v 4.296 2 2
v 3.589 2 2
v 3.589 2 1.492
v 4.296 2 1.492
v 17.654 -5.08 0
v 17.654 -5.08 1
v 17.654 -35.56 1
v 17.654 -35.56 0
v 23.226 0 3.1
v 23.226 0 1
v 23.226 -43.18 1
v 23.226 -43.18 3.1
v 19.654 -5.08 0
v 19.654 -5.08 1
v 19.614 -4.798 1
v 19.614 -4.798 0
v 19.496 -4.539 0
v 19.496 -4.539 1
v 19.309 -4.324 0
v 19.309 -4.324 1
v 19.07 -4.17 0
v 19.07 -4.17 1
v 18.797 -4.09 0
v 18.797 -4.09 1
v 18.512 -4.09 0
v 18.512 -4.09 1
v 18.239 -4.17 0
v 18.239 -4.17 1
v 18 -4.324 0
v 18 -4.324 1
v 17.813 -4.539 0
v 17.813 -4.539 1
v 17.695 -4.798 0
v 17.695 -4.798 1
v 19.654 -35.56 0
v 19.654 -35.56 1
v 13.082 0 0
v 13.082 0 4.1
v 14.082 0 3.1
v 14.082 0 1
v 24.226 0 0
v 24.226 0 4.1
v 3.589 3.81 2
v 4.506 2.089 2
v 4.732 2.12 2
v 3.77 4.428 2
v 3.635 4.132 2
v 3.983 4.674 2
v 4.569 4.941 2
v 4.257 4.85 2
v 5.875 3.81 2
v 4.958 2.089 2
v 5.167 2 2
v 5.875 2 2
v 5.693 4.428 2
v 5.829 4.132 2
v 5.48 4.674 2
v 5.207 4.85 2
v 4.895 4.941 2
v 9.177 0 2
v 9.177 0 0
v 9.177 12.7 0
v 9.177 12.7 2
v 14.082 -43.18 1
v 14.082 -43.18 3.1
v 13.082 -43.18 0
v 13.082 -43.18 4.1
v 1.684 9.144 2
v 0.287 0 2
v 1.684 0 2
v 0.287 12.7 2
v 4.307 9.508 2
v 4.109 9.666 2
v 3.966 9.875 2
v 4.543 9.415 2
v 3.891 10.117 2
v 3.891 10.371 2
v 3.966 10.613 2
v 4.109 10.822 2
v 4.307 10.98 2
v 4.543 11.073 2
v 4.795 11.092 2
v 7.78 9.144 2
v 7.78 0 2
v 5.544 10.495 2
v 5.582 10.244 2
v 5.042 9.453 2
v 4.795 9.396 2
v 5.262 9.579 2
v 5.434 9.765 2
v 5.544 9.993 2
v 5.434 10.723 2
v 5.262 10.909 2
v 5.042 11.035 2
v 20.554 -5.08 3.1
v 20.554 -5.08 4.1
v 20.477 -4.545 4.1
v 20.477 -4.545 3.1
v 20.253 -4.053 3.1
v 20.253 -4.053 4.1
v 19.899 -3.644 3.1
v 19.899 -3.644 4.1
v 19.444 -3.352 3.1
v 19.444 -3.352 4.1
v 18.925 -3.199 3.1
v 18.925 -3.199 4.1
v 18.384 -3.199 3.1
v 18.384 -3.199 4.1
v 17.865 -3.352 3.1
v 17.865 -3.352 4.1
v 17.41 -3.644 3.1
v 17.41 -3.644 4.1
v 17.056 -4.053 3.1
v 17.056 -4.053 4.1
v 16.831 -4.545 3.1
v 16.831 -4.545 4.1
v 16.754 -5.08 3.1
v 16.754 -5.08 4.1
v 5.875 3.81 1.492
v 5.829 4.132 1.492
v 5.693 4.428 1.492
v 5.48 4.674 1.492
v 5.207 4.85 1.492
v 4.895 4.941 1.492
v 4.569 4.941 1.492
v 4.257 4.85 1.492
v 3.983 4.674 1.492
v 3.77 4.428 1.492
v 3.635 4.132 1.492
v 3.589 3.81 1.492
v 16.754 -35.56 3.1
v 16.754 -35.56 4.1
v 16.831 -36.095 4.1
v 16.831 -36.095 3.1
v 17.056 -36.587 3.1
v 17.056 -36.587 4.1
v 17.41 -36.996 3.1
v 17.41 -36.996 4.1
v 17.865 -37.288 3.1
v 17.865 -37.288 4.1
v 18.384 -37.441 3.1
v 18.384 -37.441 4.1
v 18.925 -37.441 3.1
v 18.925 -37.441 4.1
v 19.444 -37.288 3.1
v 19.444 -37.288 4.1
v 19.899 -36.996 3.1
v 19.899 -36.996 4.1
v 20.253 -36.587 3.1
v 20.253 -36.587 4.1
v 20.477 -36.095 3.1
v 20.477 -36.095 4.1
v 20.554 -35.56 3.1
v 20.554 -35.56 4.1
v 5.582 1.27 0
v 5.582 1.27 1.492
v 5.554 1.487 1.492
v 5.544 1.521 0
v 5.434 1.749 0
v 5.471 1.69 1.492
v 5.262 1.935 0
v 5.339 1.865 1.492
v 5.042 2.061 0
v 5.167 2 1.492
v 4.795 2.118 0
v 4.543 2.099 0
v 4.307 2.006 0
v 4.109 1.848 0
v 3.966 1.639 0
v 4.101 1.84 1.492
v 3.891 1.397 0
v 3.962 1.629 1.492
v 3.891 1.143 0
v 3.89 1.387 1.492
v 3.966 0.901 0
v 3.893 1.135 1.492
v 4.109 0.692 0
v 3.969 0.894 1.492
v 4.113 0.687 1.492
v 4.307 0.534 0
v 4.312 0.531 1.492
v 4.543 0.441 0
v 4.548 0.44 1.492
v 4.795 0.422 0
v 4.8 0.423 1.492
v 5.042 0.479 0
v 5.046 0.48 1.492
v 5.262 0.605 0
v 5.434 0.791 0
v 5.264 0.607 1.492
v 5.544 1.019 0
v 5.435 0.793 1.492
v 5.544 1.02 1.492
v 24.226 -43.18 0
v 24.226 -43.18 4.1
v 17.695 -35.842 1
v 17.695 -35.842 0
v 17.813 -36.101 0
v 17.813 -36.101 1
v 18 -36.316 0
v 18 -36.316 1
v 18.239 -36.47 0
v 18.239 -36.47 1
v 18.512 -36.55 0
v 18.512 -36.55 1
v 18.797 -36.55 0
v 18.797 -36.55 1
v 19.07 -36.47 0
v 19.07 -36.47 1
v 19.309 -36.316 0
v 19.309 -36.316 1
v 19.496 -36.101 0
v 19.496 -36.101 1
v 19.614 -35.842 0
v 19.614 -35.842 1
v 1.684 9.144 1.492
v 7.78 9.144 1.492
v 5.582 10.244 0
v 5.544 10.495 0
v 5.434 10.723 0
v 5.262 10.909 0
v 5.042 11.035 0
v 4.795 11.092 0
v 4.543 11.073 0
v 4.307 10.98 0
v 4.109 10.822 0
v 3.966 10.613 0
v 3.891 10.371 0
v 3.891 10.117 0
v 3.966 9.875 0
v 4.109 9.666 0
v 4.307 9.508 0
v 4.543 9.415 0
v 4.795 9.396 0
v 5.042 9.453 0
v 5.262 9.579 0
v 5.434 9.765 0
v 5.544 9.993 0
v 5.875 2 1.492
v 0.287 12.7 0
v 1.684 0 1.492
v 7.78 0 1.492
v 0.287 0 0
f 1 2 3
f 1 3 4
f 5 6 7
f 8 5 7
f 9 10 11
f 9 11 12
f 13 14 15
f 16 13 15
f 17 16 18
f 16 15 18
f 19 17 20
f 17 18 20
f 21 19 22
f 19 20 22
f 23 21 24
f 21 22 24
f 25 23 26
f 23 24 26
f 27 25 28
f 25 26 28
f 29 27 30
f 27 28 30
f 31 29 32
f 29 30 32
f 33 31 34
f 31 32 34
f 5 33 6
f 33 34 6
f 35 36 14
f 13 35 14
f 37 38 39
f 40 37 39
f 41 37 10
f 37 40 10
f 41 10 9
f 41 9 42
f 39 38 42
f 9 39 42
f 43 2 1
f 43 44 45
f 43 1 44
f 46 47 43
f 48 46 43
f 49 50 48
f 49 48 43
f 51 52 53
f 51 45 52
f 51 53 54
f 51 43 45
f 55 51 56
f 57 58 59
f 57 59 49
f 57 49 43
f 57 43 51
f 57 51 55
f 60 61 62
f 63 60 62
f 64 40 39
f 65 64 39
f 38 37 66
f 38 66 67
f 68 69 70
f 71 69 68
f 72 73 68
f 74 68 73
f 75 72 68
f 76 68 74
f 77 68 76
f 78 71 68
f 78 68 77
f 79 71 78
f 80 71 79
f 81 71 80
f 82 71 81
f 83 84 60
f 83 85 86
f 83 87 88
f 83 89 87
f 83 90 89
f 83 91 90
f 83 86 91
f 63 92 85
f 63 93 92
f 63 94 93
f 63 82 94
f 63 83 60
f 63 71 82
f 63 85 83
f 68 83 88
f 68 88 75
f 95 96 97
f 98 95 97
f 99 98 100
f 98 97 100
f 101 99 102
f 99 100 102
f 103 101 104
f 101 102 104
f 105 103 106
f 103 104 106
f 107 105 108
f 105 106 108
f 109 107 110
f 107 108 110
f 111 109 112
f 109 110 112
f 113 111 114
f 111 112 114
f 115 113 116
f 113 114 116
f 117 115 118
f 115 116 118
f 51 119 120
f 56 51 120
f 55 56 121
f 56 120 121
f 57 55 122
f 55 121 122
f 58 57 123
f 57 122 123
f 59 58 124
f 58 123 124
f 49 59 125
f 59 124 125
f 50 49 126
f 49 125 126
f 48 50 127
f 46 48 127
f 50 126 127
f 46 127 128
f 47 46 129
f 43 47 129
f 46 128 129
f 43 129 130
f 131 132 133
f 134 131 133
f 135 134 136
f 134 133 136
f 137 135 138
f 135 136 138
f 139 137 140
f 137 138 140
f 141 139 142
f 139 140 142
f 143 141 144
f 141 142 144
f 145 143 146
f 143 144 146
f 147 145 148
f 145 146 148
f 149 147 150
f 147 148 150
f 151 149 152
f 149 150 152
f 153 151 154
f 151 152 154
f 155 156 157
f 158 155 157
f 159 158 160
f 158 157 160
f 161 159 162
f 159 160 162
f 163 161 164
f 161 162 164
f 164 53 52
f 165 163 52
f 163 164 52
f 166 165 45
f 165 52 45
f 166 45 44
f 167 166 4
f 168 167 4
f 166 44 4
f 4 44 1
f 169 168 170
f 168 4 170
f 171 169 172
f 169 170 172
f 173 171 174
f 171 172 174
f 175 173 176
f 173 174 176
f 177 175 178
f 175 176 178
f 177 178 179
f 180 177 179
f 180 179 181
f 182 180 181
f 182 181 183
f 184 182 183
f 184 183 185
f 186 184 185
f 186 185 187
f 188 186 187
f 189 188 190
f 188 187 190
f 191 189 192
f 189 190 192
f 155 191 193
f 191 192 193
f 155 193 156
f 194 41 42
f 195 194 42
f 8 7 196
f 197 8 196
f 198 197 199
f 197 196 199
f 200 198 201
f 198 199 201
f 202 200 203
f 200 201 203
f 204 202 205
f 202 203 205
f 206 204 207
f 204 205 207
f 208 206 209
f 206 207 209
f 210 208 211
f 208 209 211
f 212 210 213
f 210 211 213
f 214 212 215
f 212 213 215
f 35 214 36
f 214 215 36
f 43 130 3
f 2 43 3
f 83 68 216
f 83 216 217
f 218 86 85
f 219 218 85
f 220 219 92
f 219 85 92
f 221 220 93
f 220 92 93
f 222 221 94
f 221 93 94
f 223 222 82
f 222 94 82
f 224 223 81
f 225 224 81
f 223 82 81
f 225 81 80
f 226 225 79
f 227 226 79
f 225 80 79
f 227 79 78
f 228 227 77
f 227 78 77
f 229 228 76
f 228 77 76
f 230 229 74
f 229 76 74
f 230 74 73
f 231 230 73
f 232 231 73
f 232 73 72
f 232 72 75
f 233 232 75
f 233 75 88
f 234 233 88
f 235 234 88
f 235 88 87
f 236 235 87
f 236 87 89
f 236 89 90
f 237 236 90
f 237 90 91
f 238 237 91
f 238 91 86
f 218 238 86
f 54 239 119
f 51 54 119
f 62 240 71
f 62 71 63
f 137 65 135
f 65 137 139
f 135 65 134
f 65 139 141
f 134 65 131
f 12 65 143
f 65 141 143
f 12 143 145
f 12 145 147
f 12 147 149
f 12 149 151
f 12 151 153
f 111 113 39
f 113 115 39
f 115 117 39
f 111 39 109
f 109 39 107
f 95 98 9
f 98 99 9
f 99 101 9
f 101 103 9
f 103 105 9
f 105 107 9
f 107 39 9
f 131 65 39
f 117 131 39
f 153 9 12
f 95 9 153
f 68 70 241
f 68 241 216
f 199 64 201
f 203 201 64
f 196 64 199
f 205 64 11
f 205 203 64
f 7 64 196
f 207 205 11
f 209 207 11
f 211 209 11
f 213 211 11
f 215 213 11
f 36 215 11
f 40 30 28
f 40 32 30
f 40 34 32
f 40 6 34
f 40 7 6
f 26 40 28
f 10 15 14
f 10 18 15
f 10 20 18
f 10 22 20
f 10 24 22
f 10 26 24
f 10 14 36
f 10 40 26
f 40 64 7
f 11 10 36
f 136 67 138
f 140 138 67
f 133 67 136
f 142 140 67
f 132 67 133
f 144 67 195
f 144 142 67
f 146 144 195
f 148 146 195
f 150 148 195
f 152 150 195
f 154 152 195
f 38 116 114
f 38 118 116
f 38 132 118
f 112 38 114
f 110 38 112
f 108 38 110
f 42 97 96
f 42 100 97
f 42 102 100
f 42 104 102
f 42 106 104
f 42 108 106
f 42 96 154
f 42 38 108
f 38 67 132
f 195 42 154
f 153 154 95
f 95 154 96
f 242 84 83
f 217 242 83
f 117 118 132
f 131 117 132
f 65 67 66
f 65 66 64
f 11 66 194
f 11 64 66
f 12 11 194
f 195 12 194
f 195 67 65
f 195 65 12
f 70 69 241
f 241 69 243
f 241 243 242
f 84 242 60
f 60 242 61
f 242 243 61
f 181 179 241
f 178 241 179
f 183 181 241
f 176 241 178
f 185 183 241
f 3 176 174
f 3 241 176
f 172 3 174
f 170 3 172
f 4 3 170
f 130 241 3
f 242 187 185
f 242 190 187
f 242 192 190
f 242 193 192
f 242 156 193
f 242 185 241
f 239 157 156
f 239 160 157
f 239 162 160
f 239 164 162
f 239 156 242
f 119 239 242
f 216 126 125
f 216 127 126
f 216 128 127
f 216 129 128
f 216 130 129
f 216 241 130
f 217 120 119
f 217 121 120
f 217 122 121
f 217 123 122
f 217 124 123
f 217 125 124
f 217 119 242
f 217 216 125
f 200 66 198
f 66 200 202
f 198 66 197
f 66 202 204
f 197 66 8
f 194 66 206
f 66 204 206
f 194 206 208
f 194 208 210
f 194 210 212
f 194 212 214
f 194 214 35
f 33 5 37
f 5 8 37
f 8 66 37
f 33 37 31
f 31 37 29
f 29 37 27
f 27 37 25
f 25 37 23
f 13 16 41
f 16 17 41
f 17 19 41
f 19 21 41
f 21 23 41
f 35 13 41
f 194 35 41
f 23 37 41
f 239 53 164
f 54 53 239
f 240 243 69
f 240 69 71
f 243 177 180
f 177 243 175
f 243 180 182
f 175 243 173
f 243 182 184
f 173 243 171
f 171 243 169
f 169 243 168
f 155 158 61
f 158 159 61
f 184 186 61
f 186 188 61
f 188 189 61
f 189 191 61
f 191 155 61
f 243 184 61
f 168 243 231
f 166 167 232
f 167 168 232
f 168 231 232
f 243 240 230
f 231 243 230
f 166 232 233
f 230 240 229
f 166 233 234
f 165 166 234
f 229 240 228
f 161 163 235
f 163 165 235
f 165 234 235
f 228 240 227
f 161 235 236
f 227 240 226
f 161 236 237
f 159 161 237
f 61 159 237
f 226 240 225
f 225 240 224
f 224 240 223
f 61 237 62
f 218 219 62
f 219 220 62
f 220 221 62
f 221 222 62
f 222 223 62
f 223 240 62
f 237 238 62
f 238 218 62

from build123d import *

# Parameters (mm, degrees)
F0_W      = 8.89
F0_H      = 12.7
F1_DEPTH  = 2
F2_W      = 6.096
F2_H      = 9.144
F3_DEPTH  = 0.508
F5_DEPTH  = 0.508
F6_R      = 0.85
F7_DEPTH  = 25.4
F8_W      = 5.08
F8_H      = 2
F9_DEPTH  = 0.508
F10_W     = 11.144
F10_H     = 4.1
F10_W_2   = 9.144
F10_H_2   = 2.1
F11_DEPTH = 43.18
F13_DEPTH = 2.54
F15_DEPTH = 25.4


with BuildPart() as f1:
    # F0 (on Top) → F1 (new body)
    with BuildSketch(Plane.XY):
        with Locations((4.731853, 6.35)):
            Rectangle(F0_W, F0_H)
    extrude(amount=F1_DEPTH)

    # F2 (on face) → F3 (cut)
    with BuildSketch(Plane.XY.offset(2)):
        with Locations((4.731853, 4.572)):
            Rectangle(F2_W, F2_H)
    extrude(amount=-F3_DEPTH, mode=Mode.SUBTRACT)

    # F4 (on face) → F5 (join)
    with BuildSketch(Plane.XY.offset(1.492)):
        with BuildLine():
            ThreePointArc((5.874853, 3.81), (4.731853, 4.953), (3.588853, 3.81))
            Line((3.588853, 3.81), (3.588853, 1.27))
            ThreePointArc((3.588853, 1.27), (4.731853, 0.127), (5.874853, 1.27))
            Line((5.874853, 1.27), (5.874853, 3.81))
        make_face()
    extrude(amount=F5_DEPTH)

    # F6 (on face) → F7 (cut)
    with BuildSketch(Plane.XY.offset(2)):
        with Locations((4.731853, 1.27)):
            Circle(F6_R)
        with Locations((4.731853, 10.244)):
            Circle(F6_R)
    extrude(amount=-F7_DEPTH, mode=Mode.SUBTRACT)

    # F8 (on face) → F9 (cut)
    with BuildSketch(Plane.XY.offset(2)):
        with Locations((4.731853, 1)):
            Rectangle(F8_W, F8_H)
    extrude(amount=-F9_DEPTH, mode=Mode.SUBTRACT)


with BuildPart() as f11:
    # F10 (on Front) → F11 (new body)
    with BuildSketch(Plane.XZ):
        with Locations((18.654404, 2.05)):
            Rectangle(F10_W, F10_H)
        with Locations((18.654404, 2.05)):
            Rectangle(F10_W_2, F10_H_2, mode=Mode.SUBTRACT)
    extrude(amount=F11_DEPTH)

    # F12 (on face) → F13 (cut)
    with BuildSketch(Plane.XY.offset(4.1)):
        with BuildLine():
            ThreePointArc((20.554404, -5.08), (18.654404, -3.18), (16.754404, -5.08))
            Line((16.754404, -5.08), (16.754404, -35.56))
            ThreePointArc((16.754404, -35.56), (18.654404, -37.46), (20.554404, -35.56))
            Line((20.554404, -35.56), (20.554404, -5.08))
        make_face()
    extrude(amount=-F13_DEPTH, mode=Mode.SUBTRACT)

    # F14 (on face) → F15 (cut)
    with BuildSketch(Plane.XY.offset(4.1)):
        with BuildLine():
            ThreePointArc((19.654404, -5.08), (18.654404, -4.08), (17.654404, -5.08))
            Line((17.654404, -5.08), (17.654404, -35.56))
            ThreePointArc((17.654404, -35.56), (18.654404, -36.56), (19.654404, -35.56))
            Line((19.654404, -35.56), (19.654404, -5.08))
        make_face()
    extrude(amount=-F15_DEPTH, mode=Mode.SUBTRACT)


solid = Compound([f1.part, f11.part])
